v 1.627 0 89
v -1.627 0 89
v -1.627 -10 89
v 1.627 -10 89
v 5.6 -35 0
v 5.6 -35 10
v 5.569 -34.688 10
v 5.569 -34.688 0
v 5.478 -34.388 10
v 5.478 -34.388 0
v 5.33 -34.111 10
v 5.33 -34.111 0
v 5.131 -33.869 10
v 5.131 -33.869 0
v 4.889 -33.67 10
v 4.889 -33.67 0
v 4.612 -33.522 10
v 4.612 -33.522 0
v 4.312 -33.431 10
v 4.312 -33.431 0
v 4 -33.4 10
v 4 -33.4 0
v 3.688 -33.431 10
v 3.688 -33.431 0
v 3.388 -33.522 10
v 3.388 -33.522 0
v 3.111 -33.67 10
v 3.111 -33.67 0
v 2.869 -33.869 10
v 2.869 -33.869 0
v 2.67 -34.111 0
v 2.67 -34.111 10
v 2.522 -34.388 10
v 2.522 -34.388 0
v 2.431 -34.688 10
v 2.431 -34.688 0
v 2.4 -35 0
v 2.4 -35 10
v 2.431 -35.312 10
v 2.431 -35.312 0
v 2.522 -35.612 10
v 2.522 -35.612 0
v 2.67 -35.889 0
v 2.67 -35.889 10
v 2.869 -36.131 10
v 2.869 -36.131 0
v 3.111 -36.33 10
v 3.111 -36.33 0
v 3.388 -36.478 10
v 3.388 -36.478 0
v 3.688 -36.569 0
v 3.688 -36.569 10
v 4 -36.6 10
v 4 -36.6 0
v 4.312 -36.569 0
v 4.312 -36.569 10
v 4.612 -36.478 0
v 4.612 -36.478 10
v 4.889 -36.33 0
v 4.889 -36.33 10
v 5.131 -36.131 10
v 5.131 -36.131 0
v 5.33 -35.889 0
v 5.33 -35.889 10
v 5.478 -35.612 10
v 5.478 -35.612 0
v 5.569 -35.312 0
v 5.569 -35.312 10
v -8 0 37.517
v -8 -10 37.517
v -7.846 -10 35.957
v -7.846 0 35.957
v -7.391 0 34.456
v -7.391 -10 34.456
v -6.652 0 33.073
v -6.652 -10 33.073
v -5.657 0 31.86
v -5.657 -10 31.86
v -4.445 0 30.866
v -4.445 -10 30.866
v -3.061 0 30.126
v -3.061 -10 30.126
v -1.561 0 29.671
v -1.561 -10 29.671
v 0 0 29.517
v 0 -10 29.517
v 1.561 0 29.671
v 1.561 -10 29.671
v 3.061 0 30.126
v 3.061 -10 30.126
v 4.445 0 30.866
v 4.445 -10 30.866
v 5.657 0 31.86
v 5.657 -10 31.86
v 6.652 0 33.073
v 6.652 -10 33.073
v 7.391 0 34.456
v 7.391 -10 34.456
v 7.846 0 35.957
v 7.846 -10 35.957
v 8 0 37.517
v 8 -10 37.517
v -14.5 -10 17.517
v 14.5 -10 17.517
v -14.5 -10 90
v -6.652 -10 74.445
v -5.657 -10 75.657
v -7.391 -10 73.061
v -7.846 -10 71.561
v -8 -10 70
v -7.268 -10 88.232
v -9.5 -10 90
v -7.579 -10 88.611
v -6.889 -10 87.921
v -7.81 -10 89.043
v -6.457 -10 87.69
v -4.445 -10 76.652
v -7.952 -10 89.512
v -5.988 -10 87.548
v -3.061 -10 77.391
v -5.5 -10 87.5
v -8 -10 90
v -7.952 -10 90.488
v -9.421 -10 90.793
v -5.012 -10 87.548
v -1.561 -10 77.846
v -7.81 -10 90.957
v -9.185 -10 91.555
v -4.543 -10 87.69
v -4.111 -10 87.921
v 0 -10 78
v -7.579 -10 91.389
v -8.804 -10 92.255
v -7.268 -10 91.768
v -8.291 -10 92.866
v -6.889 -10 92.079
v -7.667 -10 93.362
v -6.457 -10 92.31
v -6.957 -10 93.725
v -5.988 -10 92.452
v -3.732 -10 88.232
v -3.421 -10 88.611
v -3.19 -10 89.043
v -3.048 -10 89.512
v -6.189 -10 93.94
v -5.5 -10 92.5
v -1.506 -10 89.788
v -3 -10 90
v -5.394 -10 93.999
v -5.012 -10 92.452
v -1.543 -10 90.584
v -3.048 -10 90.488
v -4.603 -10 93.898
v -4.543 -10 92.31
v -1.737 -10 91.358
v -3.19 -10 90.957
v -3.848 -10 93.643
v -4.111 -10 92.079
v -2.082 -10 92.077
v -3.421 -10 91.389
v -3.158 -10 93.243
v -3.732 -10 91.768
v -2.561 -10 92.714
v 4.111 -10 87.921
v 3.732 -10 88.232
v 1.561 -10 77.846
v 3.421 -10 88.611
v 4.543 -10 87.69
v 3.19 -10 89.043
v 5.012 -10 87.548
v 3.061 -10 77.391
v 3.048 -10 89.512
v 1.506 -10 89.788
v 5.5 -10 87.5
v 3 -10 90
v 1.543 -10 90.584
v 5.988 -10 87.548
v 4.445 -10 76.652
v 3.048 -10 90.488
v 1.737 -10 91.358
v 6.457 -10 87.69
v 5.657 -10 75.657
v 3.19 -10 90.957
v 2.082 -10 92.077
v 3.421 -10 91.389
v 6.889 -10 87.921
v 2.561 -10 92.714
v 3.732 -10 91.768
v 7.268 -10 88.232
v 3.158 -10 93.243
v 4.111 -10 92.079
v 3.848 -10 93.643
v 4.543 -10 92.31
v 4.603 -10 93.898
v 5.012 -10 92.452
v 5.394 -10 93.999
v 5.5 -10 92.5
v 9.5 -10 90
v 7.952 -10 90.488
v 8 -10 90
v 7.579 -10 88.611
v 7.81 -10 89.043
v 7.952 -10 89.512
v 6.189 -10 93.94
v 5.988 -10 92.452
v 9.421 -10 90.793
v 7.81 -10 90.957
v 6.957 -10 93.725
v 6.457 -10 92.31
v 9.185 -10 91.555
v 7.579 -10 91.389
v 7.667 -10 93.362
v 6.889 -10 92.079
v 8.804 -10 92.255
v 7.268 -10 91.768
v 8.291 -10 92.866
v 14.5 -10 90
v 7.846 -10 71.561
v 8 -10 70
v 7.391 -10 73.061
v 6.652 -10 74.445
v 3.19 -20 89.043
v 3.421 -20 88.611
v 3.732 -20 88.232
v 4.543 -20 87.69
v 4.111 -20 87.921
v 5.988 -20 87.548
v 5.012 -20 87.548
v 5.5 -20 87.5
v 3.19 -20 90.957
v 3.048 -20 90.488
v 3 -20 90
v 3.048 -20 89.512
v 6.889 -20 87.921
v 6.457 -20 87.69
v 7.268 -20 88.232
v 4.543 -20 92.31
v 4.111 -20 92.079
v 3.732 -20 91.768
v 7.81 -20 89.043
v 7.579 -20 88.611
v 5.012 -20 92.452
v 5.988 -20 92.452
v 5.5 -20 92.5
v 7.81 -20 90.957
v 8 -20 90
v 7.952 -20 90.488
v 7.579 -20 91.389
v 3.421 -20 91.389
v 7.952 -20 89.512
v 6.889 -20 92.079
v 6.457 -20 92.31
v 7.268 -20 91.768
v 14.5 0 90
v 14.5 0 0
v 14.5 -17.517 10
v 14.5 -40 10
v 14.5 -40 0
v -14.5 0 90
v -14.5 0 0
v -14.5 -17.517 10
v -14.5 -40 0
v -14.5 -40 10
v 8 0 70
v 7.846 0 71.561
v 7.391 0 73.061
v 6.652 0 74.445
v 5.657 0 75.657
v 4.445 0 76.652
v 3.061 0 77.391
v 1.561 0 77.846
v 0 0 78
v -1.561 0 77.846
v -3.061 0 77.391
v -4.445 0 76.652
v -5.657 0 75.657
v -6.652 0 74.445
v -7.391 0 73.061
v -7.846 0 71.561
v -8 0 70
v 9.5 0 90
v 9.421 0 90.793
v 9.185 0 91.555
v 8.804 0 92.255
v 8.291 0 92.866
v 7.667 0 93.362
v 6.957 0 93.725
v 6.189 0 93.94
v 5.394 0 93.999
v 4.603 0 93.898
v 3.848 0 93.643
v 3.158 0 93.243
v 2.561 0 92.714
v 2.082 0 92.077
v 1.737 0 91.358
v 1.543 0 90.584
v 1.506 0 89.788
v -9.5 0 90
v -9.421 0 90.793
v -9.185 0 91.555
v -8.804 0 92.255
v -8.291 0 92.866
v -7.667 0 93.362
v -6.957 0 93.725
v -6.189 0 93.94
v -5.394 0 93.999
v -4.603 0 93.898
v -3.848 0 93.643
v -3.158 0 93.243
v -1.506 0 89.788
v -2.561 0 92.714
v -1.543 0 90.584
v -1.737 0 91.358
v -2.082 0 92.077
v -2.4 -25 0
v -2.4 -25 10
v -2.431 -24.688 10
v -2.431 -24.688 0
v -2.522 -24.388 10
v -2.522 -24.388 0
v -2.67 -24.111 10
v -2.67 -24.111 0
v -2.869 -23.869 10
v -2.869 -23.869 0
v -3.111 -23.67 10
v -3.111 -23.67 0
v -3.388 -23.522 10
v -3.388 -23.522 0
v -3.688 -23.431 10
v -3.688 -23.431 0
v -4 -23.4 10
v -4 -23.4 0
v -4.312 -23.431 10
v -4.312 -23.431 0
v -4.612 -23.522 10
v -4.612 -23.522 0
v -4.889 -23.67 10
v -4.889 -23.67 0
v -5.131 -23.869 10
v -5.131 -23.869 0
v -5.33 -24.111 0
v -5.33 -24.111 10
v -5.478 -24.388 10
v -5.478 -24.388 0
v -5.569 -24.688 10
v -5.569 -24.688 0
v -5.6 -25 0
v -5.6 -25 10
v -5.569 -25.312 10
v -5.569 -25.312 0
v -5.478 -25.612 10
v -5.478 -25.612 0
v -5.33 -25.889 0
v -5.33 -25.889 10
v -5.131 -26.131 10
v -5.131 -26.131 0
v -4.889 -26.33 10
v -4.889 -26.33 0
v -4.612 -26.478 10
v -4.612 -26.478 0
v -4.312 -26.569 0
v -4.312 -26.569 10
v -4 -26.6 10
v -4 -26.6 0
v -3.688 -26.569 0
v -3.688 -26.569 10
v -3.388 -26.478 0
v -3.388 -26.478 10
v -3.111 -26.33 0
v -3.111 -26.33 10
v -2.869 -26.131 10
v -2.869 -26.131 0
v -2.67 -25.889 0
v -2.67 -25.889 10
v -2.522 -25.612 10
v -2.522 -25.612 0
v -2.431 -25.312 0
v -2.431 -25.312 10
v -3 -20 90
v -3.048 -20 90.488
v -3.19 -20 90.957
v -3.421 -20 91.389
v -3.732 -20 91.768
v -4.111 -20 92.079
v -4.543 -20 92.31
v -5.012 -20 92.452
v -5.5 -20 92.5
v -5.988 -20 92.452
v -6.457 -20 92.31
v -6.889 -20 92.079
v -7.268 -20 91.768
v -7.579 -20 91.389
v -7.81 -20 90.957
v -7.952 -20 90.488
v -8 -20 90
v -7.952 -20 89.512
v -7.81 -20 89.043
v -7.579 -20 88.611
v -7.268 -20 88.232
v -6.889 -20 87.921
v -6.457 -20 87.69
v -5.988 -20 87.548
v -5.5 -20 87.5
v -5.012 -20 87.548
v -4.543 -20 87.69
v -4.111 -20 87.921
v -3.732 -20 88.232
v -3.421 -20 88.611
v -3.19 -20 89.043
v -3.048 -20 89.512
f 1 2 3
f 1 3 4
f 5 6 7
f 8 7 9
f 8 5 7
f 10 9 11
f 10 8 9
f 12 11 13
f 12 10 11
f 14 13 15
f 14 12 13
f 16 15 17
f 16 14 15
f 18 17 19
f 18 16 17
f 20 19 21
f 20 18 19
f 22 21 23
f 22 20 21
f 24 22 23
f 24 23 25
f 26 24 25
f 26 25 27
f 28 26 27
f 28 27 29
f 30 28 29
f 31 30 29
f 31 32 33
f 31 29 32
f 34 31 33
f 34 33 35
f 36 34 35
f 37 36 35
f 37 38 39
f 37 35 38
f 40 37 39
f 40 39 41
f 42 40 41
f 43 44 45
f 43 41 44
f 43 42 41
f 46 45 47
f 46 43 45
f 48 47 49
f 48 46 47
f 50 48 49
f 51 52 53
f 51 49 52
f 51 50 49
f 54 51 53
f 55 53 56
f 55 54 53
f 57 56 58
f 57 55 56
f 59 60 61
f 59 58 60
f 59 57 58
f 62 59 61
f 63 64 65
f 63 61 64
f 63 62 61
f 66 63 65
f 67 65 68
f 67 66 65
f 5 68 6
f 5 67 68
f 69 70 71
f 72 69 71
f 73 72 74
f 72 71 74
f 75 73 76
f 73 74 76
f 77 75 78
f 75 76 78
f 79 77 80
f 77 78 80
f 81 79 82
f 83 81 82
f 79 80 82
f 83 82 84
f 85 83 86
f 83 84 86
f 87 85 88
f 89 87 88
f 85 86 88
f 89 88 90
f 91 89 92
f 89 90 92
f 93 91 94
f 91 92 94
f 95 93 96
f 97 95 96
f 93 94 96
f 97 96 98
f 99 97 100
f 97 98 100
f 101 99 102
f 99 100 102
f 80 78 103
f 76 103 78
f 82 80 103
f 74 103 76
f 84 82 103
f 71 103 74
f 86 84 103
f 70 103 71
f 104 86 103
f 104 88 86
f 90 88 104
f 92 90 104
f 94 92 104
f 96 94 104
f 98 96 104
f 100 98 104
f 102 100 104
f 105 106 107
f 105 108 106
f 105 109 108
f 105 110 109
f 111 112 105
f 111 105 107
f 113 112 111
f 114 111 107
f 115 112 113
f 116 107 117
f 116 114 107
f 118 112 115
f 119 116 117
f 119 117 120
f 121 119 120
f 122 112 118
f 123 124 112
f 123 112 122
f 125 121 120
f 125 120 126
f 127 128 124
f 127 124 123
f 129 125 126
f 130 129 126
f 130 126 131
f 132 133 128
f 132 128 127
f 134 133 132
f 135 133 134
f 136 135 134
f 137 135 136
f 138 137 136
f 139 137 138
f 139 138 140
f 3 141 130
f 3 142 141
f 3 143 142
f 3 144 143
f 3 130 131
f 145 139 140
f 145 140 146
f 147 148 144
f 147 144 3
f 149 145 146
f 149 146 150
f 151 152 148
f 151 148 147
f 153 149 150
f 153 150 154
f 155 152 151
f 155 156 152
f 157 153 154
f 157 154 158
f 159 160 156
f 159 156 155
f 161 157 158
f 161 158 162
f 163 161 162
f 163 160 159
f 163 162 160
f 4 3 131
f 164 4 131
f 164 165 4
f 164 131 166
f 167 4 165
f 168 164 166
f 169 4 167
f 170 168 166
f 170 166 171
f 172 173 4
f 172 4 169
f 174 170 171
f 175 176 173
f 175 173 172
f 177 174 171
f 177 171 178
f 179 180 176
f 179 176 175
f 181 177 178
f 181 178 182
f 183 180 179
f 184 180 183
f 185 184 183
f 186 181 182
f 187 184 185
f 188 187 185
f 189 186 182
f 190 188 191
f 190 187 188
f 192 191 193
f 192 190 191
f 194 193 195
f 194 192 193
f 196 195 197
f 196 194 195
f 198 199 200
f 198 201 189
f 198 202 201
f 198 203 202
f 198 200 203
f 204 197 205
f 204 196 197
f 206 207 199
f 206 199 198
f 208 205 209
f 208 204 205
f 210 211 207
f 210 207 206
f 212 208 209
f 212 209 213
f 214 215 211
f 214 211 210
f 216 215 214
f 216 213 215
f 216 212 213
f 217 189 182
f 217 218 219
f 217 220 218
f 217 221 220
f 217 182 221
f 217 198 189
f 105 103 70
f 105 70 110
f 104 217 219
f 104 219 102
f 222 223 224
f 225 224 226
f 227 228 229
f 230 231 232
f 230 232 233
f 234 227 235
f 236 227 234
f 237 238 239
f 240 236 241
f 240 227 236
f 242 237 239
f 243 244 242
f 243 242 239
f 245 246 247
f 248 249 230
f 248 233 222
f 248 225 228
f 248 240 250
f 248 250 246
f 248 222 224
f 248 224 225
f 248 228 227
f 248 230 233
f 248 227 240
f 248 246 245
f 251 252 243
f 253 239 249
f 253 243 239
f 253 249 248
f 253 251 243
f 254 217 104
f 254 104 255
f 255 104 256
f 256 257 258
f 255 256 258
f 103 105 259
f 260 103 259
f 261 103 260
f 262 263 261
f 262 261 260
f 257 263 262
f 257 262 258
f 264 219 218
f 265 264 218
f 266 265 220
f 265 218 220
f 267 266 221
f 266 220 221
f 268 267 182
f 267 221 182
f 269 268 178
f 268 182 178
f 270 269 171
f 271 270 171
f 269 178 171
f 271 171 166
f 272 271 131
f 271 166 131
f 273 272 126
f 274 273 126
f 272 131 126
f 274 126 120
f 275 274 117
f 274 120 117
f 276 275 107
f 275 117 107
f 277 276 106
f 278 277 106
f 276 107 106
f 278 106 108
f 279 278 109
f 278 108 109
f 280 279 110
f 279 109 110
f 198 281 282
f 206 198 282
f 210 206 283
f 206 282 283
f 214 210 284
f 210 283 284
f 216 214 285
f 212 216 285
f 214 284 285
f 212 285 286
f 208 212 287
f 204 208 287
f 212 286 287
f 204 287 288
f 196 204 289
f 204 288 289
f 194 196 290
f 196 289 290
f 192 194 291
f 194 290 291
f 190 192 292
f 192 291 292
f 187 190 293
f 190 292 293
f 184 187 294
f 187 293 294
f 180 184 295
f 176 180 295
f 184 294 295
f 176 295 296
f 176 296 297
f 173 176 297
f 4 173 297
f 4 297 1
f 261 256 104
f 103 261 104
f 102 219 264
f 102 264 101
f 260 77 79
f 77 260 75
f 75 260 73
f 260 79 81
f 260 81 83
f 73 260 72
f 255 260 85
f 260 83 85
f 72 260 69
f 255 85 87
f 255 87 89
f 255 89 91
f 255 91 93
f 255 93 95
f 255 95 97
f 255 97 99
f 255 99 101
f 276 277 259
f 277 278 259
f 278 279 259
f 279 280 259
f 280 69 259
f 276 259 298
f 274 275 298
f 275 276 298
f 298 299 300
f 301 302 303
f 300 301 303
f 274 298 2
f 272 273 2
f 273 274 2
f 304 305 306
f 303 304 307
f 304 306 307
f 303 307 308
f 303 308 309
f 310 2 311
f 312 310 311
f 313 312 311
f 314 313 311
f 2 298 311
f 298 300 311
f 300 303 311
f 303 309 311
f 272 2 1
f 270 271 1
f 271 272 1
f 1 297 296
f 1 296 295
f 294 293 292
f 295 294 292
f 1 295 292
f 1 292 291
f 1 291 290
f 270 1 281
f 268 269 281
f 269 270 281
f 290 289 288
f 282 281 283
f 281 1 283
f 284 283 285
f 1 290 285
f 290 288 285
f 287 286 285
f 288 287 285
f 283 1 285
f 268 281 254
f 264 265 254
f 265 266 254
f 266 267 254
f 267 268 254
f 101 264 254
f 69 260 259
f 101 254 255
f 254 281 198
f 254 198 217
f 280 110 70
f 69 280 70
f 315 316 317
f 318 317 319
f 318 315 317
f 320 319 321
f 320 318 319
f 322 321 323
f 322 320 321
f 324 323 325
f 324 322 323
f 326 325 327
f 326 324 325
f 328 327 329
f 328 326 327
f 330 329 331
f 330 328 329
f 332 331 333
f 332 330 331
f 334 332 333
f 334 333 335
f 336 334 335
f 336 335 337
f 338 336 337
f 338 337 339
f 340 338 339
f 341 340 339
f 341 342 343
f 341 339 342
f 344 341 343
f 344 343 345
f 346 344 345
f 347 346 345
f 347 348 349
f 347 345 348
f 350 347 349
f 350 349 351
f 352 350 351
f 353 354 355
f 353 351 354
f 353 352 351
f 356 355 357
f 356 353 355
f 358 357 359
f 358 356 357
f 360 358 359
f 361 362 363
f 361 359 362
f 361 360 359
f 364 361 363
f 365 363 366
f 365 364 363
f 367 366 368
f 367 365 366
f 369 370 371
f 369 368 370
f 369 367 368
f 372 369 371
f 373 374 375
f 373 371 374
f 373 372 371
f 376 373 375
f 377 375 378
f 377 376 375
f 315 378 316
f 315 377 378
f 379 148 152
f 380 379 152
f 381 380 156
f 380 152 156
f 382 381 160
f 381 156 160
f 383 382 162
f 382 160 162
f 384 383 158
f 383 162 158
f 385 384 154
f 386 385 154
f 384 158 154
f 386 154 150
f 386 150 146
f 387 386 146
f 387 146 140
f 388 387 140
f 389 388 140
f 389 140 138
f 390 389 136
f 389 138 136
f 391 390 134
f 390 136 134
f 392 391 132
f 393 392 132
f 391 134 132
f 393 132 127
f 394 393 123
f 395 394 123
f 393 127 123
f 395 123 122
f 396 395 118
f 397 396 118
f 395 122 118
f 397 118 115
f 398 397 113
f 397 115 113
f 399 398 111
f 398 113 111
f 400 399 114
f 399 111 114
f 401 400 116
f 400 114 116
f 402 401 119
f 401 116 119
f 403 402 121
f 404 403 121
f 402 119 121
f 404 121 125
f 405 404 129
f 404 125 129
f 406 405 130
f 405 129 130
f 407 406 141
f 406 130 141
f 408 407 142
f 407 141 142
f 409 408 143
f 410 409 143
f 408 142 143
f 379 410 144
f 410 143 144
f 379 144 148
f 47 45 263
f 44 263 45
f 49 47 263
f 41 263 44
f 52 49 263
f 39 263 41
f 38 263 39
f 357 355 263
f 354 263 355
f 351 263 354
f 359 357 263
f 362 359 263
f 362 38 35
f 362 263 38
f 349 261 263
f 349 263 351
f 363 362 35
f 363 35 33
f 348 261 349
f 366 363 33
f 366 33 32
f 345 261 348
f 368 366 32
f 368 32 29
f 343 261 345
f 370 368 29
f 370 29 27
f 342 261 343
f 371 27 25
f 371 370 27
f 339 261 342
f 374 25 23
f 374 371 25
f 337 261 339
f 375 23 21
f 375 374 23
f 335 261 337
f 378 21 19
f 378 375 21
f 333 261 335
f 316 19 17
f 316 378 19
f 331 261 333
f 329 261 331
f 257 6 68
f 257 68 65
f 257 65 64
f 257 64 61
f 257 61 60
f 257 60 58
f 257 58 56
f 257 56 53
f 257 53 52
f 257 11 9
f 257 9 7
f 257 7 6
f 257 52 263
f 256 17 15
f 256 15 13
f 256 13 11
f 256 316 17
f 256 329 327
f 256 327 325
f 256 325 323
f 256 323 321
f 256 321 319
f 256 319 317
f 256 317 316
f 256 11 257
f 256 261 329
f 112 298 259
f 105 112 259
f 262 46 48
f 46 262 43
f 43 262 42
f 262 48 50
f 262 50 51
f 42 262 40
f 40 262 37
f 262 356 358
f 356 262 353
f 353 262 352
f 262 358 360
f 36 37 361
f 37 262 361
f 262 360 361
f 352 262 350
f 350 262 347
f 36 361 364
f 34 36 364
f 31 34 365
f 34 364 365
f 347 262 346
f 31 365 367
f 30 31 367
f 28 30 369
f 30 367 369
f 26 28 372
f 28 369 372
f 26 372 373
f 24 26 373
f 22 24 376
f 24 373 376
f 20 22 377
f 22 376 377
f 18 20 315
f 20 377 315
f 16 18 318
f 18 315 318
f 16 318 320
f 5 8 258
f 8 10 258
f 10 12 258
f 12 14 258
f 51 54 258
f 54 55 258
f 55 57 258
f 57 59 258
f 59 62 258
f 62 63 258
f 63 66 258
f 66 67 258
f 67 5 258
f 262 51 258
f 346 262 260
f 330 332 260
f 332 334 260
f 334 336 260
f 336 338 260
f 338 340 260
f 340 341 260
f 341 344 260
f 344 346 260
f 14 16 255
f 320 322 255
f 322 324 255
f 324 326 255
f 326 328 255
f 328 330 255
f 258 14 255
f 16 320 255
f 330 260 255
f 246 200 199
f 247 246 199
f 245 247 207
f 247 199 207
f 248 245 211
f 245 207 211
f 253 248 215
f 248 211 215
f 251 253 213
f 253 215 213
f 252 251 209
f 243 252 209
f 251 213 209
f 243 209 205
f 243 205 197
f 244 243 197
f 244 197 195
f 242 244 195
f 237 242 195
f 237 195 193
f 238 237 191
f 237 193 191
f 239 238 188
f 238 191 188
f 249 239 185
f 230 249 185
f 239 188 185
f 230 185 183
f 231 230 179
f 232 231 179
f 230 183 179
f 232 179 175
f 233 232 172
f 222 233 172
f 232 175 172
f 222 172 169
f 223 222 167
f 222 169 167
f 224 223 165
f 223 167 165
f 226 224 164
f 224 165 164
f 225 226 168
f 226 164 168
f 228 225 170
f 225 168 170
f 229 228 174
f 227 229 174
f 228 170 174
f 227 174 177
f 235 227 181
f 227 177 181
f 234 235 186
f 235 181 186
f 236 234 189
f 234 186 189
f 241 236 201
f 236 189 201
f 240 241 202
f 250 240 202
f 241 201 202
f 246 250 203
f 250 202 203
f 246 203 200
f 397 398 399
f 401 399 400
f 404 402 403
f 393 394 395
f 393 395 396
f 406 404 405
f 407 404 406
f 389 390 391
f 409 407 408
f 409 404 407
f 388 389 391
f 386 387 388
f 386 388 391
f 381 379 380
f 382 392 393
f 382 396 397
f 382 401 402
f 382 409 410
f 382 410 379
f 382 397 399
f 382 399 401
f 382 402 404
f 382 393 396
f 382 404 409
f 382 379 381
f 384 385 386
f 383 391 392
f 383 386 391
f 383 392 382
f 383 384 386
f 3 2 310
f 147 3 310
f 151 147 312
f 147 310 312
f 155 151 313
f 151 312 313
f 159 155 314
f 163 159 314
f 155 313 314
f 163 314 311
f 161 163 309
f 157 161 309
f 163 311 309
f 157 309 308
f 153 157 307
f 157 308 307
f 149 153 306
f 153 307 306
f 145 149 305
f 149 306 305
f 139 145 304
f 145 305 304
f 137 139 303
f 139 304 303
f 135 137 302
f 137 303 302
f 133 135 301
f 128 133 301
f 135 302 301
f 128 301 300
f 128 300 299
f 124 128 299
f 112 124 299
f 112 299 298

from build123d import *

# Parameters (mm, degrees)
PAD007_DEPTH         = 10
SKETCH017_W          = 29
SKETCH017_H          = 10
PAD008_DEPTH         = 30
SKETCH018_R          = 1.6
POCKET007_DEPTH      = 0.001
POCKET007_DEPTH_BACK = 94.001
PAD009_DEPTH         = 29
SKETCH020_R          = 2.5
PAD010_DEPTH         = 10
POCKET008_DEPTH      = 10.001


with BuildPart() as part:
    # Sketch016 → Pad007 (new body)
    with BuildSketch(Plane.XZ):
        with BuildLine():
            ThreePointArc((9.5, 90), (4.995983, 93.968119), (1.627017, 89))
            Line((-1.627017, 89), (1.627017, 89))
            ThreePointArc((-1.627017, 89), (-4.995983, 93.968119), (-9.5, 90))
            Line((-9.5, 90), (-14.5, 90))
            Line((-14.5, 90), (-14.5, 0))
            Line((-14.5, 0), (14.5, 0))
            Line((14.5, 90), (14.5, 0))
            Line((9.5, 90), (14.5, 90))
        make_face()
        Polygon((9.5, 90), (14.5, 90), align=None)
    extrude(amount=PAD007_DEPTH)

    # Sketch017 (on Face10 of Pad007) → Pad008 (join)
    with BuildSketch(Plane.XZ.offset(10)):
        with Locations((0, 5)):
            Rectangle(SKETCH017_W, SKETCH017_H)
    extrude(amount=PAD008_DEPTH)

    # Sketch018 → Pocket007 (cut, two sides)
    with BuildSketch(Plane.XY) as pocket007_sk:
        with Locations((-4, -25)):
            Circle(SKETCH018_R)
        with Locations((4, -35)):
            Circle(SKETCH018_R)
    extrude(amount=-POCKET007_DEPTH, mode=Mode.SUBTRACT)
    extrude(pocket007_sk.sketch, amount=POCKET007_DEPTH_BACK, mode=Mode.SUBTRACT)

    # Sketch019 (on Face3 of Pocket007) → Pad009 (join)
    with BuildSketch(Plane(origin=(14.5, 0, 0), x_dir=(0, 0, 1), z_dir=(1, 0, 0))):
        Polygon((10, 17.517339), (17.517341, 10), (10, 10), align=None)
    extrude(amount=-PAD009_DEPTH)

    # Sketch020 (on Face4 of Pad009) → Pad010 (join)
    with BuildSketch(Plane.XZ.offset(10)):
        with Locations((-5.5, 90)):
            Circle(SKETCH020_R)
        with Locations((5.5, 90)):
            Circle(SKETCH020_R)
    extrude(amount=PAD010_DEPTH)

    # Sketch021 (on Face5 of Pad010) → Pocket008 (cut, through all)
    with BuildSketch(Plane.XZ.offset(10)):
        with BuildLine():
            ThreePointArc((8, 70), (0, 78), (-8, 70))
            Line((-8, 70), (-8, 37.517341))
            ThreePointArc((-8, 37.517341), (0, 29.517341), (8, 37.517341))
            Line((8, 70), (8, 37.517341))
        make_face()
    extrude(amount=-POCKET008_DEPTH, mode=Mode.SUBTRACT)


solid = part.part
